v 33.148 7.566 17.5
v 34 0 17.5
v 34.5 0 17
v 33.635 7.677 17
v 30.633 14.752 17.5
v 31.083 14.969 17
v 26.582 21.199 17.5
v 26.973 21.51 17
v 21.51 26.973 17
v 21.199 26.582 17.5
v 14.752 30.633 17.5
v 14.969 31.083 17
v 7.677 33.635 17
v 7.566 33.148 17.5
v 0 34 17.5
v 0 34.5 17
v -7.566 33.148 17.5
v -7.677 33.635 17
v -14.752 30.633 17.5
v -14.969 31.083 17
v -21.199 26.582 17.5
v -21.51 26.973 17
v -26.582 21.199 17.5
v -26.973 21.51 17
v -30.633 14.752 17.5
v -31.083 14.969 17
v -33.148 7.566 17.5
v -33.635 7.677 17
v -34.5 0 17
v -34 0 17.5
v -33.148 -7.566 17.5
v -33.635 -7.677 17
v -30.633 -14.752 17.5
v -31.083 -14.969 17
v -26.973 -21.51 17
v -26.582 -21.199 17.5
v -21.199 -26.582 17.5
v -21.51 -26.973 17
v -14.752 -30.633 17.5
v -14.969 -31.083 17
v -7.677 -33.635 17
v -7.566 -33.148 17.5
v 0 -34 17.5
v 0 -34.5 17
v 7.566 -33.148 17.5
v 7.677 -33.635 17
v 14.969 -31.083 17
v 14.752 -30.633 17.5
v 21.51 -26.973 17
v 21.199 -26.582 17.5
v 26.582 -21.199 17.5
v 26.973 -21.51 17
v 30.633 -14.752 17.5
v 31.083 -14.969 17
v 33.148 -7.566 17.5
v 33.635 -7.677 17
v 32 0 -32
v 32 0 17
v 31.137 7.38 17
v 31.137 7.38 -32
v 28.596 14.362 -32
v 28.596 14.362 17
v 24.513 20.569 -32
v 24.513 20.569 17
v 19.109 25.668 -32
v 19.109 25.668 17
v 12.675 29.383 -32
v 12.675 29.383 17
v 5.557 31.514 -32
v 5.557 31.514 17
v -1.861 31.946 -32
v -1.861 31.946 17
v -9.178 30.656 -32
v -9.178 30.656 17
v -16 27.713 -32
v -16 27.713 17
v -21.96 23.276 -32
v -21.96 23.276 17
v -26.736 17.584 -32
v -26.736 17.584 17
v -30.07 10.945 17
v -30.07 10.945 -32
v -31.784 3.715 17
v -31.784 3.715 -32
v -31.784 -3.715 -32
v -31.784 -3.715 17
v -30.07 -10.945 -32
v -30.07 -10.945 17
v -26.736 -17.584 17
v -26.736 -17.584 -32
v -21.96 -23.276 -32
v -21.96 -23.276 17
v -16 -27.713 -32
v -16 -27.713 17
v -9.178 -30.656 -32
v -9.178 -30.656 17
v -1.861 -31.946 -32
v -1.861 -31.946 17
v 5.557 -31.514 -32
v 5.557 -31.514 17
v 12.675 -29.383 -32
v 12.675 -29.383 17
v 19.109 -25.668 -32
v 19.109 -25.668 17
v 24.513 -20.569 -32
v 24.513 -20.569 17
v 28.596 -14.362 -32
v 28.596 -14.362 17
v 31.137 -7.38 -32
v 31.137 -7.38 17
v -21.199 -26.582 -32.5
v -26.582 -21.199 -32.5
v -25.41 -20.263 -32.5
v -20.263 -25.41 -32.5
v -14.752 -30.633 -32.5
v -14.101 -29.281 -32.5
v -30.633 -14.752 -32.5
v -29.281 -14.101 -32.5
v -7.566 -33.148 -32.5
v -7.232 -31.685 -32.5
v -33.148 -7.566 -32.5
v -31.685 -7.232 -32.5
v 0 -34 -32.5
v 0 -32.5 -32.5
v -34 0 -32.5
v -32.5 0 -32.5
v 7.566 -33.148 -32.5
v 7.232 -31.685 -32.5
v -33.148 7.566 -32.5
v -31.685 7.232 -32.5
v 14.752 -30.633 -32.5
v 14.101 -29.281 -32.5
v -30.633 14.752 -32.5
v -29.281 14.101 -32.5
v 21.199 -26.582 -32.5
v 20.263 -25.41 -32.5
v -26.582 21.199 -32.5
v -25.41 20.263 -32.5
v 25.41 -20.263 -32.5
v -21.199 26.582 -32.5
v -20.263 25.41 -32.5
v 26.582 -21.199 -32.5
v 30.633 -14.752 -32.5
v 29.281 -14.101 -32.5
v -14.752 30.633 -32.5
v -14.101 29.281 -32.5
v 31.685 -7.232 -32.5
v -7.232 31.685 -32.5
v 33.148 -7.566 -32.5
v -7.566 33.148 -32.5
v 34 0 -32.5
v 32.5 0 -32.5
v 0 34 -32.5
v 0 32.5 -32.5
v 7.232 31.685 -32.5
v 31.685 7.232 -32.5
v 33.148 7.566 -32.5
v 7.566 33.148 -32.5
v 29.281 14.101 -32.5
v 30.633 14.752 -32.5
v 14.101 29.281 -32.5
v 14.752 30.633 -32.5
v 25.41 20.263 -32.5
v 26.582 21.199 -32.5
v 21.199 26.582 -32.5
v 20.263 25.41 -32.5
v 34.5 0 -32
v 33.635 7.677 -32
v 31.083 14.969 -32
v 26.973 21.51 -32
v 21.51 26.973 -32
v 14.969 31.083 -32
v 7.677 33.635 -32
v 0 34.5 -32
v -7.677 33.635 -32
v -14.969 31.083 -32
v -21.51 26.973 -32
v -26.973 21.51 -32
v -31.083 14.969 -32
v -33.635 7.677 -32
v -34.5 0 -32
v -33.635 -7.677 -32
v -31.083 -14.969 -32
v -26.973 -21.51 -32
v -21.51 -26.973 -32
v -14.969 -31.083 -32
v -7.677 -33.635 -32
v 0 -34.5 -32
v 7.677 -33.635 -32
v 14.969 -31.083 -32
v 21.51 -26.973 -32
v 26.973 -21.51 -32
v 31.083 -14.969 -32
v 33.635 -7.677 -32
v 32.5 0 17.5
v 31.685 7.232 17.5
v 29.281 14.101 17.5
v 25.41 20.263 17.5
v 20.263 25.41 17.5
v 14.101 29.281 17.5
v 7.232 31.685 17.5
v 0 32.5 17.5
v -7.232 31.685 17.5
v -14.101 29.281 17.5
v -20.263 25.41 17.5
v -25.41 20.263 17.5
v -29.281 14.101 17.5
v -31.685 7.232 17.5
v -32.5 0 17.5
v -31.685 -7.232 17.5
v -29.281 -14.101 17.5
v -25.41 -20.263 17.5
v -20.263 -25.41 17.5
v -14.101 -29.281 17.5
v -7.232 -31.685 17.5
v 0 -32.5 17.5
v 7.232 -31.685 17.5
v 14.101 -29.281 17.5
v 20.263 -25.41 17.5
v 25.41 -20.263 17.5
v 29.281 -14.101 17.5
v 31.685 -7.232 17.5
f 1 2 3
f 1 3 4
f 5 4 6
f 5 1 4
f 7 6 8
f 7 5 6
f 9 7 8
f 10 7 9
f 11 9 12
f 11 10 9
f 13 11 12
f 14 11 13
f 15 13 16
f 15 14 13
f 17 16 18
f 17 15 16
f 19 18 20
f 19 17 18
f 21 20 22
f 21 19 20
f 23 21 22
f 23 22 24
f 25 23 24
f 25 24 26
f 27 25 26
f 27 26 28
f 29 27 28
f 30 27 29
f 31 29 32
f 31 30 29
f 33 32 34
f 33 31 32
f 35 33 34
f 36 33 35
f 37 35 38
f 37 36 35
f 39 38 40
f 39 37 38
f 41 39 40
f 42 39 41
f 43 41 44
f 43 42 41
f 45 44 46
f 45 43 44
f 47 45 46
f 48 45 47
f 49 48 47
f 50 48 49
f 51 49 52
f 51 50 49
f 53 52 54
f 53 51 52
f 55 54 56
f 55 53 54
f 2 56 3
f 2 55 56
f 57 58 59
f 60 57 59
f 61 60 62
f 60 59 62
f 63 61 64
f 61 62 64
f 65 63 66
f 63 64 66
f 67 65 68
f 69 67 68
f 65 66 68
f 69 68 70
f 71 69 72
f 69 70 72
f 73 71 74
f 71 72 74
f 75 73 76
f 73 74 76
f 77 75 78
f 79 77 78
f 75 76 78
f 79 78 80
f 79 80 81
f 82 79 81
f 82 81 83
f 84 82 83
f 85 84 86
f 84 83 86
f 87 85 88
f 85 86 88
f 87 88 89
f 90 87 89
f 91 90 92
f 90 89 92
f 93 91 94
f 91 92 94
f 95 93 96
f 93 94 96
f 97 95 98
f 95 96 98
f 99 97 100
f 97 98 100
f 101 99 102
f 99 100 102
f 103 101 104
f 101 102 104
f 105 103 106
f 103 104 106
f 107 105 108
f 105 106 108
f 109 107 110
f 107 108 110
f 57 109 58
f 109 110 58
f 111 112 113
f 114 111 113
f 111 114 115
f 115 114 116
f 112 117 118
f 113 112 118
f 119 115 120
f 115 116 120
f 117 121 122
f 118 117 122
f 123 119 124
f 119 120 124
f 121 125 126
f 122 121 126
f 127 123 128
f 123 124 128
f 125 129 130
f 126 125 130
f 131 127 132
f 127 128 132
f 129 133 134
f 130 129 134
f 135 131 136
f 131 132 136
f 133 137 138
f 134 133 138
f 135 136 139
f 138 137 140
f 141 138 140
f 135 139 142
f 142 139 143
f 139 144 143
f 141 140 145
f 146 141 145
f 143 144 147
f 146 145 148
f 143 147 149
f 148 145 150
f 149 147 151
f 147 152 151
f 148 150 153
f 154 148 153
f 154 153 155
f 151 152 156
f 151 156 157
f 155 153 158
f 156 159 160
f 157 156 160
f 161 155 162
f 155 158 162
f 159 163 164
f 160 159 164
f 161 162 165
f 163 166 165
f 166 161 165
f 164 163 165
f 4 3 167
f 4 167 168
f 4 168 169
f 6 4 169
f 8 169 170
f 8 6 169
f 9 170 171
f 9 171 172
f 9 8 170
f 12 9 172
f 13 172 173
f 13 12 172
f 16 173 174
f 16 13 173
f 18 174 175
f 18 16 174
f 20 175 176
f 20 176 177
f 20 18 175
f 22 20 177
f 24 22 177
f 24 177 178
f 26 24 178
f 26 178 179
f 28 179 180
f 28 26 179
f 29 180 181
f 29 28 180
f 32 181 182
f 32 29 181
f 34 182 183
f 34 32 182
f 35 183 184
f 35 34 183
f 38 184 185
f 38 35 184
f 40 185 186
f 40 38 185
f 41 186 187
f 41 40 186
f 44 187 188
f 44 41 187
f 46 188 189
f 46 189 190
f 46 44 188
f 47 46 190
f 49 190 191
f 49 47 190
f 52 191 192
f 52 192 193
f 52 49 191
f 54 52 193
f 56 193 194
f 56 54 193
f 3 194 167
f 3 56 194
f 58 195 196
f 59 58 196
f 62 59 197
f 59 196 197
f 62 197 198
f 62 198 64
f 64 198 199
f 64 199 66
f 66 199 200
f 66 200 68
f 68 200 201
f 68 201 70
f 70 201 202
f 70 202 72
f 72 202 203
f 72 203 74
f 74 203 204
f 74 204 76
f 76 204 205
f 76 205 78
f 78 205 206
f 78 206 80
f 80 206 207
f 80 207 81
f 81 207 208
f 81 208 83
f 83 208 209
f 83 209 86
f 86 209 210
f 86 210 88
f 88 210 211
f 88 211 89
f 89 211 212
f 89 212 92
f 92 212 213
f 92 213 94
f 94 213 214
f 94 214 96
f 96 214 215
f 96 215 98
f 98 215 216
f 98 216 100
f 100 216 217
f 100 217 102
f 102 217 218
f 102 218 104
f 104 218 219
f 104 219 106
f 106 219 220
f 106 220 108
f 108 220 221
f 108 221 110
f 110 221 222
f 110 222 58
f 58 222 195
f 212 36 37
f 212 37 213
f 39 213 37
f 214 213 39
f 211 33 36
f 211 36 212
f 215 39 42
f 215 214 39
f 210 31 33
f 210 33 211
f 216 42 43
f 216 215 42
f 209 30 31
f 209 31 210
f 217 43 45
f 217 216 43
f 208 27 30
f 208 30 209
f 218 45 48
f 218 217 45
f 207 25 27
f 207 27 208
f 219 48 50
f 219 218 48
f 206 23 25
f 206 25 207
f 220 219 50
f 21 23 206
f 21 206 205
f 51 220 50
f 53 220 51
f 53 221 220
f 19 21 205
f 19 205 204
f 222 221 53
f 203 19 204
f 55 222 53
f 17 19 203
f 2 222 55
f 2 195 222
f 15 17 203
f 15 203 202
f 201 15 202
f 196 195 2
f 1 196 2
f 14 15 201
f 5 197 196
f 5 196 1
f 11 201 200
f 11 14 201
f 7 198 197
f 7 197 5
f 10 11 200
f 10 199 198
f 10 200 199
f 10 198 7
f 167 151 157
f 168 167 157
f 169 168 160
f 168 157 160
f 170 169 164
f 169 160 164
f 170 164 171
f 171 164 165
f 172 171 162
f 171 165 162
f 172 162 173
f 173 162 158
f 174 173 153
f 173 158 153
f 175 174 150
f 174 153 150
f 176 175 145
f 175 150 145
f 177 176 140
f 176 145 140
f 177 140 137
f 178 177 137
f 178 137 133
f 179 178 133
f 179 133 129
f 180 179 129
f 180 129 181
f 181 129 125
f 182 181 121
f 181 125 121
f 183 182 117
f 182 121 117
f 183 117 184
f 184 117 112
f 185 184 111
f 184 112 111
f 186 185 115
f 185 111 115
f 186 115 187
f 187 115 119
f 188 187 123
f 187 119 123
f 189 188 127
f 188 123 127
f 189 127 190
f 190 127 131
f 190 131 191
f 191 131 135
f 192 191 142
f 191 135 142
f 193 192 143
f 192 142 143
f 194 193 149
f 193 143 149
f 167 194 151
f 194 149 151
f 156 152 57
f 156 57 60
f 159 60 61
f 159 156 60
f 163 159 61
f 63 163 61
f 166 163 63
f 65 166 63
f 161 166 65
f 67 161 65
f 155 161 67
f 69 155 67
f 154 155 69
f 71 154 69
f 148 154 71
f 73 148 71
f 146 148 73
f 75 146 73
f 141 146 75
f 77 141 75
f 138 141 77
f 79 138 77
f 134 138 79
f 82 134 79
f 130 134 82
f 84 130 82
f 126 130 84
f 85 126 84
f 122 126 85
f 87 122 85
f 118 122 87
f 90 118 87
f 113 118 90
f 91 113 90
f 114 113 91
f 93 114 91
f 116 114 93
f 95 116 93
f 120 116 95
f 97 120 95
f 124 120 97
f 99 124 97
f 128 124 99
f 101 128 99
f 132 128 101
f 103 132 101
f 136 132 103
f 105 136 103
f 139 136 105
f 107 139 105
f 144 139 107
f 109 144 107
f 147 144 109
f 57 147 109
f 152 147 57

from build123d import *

# Parameters (mm, degrees)
BOSS_EXTRUDE1_START = 17.5
SKETCH1_R           = 34.5
SKETCH1_R_2         = 32
BOSS_EXTRUDE1_DEPTH = 50
CHAMFER1_SIZE       = 0.5


with BuildPart() as part:
    # Sketch1 → Boss-Extrude1 (new body)
    with BuildSketch(Plane.XY.offset(BOSS_EXTRUDE1_START)):
        Circle(SKETCH1_R)
        Circle(SKETCH1_R_2, mode=Mode.SUBTRACT)
    extrude(amount=-BOSS_EXTRUDE1_DEPTH)

    # Chamfer1
    chamfer1_edges = [part.edges().sort_by_distance(p)[0] for p in [
        (-34.5, 0, 17.5),
        (-32, 0, 17.5),
        (-34.5, 0, -32.5),
        (-32, 0, -32.5),
    ]]
    chamfer(chamfer1_edges, length=CHAMFER1_SIZE)


solid = part.part
